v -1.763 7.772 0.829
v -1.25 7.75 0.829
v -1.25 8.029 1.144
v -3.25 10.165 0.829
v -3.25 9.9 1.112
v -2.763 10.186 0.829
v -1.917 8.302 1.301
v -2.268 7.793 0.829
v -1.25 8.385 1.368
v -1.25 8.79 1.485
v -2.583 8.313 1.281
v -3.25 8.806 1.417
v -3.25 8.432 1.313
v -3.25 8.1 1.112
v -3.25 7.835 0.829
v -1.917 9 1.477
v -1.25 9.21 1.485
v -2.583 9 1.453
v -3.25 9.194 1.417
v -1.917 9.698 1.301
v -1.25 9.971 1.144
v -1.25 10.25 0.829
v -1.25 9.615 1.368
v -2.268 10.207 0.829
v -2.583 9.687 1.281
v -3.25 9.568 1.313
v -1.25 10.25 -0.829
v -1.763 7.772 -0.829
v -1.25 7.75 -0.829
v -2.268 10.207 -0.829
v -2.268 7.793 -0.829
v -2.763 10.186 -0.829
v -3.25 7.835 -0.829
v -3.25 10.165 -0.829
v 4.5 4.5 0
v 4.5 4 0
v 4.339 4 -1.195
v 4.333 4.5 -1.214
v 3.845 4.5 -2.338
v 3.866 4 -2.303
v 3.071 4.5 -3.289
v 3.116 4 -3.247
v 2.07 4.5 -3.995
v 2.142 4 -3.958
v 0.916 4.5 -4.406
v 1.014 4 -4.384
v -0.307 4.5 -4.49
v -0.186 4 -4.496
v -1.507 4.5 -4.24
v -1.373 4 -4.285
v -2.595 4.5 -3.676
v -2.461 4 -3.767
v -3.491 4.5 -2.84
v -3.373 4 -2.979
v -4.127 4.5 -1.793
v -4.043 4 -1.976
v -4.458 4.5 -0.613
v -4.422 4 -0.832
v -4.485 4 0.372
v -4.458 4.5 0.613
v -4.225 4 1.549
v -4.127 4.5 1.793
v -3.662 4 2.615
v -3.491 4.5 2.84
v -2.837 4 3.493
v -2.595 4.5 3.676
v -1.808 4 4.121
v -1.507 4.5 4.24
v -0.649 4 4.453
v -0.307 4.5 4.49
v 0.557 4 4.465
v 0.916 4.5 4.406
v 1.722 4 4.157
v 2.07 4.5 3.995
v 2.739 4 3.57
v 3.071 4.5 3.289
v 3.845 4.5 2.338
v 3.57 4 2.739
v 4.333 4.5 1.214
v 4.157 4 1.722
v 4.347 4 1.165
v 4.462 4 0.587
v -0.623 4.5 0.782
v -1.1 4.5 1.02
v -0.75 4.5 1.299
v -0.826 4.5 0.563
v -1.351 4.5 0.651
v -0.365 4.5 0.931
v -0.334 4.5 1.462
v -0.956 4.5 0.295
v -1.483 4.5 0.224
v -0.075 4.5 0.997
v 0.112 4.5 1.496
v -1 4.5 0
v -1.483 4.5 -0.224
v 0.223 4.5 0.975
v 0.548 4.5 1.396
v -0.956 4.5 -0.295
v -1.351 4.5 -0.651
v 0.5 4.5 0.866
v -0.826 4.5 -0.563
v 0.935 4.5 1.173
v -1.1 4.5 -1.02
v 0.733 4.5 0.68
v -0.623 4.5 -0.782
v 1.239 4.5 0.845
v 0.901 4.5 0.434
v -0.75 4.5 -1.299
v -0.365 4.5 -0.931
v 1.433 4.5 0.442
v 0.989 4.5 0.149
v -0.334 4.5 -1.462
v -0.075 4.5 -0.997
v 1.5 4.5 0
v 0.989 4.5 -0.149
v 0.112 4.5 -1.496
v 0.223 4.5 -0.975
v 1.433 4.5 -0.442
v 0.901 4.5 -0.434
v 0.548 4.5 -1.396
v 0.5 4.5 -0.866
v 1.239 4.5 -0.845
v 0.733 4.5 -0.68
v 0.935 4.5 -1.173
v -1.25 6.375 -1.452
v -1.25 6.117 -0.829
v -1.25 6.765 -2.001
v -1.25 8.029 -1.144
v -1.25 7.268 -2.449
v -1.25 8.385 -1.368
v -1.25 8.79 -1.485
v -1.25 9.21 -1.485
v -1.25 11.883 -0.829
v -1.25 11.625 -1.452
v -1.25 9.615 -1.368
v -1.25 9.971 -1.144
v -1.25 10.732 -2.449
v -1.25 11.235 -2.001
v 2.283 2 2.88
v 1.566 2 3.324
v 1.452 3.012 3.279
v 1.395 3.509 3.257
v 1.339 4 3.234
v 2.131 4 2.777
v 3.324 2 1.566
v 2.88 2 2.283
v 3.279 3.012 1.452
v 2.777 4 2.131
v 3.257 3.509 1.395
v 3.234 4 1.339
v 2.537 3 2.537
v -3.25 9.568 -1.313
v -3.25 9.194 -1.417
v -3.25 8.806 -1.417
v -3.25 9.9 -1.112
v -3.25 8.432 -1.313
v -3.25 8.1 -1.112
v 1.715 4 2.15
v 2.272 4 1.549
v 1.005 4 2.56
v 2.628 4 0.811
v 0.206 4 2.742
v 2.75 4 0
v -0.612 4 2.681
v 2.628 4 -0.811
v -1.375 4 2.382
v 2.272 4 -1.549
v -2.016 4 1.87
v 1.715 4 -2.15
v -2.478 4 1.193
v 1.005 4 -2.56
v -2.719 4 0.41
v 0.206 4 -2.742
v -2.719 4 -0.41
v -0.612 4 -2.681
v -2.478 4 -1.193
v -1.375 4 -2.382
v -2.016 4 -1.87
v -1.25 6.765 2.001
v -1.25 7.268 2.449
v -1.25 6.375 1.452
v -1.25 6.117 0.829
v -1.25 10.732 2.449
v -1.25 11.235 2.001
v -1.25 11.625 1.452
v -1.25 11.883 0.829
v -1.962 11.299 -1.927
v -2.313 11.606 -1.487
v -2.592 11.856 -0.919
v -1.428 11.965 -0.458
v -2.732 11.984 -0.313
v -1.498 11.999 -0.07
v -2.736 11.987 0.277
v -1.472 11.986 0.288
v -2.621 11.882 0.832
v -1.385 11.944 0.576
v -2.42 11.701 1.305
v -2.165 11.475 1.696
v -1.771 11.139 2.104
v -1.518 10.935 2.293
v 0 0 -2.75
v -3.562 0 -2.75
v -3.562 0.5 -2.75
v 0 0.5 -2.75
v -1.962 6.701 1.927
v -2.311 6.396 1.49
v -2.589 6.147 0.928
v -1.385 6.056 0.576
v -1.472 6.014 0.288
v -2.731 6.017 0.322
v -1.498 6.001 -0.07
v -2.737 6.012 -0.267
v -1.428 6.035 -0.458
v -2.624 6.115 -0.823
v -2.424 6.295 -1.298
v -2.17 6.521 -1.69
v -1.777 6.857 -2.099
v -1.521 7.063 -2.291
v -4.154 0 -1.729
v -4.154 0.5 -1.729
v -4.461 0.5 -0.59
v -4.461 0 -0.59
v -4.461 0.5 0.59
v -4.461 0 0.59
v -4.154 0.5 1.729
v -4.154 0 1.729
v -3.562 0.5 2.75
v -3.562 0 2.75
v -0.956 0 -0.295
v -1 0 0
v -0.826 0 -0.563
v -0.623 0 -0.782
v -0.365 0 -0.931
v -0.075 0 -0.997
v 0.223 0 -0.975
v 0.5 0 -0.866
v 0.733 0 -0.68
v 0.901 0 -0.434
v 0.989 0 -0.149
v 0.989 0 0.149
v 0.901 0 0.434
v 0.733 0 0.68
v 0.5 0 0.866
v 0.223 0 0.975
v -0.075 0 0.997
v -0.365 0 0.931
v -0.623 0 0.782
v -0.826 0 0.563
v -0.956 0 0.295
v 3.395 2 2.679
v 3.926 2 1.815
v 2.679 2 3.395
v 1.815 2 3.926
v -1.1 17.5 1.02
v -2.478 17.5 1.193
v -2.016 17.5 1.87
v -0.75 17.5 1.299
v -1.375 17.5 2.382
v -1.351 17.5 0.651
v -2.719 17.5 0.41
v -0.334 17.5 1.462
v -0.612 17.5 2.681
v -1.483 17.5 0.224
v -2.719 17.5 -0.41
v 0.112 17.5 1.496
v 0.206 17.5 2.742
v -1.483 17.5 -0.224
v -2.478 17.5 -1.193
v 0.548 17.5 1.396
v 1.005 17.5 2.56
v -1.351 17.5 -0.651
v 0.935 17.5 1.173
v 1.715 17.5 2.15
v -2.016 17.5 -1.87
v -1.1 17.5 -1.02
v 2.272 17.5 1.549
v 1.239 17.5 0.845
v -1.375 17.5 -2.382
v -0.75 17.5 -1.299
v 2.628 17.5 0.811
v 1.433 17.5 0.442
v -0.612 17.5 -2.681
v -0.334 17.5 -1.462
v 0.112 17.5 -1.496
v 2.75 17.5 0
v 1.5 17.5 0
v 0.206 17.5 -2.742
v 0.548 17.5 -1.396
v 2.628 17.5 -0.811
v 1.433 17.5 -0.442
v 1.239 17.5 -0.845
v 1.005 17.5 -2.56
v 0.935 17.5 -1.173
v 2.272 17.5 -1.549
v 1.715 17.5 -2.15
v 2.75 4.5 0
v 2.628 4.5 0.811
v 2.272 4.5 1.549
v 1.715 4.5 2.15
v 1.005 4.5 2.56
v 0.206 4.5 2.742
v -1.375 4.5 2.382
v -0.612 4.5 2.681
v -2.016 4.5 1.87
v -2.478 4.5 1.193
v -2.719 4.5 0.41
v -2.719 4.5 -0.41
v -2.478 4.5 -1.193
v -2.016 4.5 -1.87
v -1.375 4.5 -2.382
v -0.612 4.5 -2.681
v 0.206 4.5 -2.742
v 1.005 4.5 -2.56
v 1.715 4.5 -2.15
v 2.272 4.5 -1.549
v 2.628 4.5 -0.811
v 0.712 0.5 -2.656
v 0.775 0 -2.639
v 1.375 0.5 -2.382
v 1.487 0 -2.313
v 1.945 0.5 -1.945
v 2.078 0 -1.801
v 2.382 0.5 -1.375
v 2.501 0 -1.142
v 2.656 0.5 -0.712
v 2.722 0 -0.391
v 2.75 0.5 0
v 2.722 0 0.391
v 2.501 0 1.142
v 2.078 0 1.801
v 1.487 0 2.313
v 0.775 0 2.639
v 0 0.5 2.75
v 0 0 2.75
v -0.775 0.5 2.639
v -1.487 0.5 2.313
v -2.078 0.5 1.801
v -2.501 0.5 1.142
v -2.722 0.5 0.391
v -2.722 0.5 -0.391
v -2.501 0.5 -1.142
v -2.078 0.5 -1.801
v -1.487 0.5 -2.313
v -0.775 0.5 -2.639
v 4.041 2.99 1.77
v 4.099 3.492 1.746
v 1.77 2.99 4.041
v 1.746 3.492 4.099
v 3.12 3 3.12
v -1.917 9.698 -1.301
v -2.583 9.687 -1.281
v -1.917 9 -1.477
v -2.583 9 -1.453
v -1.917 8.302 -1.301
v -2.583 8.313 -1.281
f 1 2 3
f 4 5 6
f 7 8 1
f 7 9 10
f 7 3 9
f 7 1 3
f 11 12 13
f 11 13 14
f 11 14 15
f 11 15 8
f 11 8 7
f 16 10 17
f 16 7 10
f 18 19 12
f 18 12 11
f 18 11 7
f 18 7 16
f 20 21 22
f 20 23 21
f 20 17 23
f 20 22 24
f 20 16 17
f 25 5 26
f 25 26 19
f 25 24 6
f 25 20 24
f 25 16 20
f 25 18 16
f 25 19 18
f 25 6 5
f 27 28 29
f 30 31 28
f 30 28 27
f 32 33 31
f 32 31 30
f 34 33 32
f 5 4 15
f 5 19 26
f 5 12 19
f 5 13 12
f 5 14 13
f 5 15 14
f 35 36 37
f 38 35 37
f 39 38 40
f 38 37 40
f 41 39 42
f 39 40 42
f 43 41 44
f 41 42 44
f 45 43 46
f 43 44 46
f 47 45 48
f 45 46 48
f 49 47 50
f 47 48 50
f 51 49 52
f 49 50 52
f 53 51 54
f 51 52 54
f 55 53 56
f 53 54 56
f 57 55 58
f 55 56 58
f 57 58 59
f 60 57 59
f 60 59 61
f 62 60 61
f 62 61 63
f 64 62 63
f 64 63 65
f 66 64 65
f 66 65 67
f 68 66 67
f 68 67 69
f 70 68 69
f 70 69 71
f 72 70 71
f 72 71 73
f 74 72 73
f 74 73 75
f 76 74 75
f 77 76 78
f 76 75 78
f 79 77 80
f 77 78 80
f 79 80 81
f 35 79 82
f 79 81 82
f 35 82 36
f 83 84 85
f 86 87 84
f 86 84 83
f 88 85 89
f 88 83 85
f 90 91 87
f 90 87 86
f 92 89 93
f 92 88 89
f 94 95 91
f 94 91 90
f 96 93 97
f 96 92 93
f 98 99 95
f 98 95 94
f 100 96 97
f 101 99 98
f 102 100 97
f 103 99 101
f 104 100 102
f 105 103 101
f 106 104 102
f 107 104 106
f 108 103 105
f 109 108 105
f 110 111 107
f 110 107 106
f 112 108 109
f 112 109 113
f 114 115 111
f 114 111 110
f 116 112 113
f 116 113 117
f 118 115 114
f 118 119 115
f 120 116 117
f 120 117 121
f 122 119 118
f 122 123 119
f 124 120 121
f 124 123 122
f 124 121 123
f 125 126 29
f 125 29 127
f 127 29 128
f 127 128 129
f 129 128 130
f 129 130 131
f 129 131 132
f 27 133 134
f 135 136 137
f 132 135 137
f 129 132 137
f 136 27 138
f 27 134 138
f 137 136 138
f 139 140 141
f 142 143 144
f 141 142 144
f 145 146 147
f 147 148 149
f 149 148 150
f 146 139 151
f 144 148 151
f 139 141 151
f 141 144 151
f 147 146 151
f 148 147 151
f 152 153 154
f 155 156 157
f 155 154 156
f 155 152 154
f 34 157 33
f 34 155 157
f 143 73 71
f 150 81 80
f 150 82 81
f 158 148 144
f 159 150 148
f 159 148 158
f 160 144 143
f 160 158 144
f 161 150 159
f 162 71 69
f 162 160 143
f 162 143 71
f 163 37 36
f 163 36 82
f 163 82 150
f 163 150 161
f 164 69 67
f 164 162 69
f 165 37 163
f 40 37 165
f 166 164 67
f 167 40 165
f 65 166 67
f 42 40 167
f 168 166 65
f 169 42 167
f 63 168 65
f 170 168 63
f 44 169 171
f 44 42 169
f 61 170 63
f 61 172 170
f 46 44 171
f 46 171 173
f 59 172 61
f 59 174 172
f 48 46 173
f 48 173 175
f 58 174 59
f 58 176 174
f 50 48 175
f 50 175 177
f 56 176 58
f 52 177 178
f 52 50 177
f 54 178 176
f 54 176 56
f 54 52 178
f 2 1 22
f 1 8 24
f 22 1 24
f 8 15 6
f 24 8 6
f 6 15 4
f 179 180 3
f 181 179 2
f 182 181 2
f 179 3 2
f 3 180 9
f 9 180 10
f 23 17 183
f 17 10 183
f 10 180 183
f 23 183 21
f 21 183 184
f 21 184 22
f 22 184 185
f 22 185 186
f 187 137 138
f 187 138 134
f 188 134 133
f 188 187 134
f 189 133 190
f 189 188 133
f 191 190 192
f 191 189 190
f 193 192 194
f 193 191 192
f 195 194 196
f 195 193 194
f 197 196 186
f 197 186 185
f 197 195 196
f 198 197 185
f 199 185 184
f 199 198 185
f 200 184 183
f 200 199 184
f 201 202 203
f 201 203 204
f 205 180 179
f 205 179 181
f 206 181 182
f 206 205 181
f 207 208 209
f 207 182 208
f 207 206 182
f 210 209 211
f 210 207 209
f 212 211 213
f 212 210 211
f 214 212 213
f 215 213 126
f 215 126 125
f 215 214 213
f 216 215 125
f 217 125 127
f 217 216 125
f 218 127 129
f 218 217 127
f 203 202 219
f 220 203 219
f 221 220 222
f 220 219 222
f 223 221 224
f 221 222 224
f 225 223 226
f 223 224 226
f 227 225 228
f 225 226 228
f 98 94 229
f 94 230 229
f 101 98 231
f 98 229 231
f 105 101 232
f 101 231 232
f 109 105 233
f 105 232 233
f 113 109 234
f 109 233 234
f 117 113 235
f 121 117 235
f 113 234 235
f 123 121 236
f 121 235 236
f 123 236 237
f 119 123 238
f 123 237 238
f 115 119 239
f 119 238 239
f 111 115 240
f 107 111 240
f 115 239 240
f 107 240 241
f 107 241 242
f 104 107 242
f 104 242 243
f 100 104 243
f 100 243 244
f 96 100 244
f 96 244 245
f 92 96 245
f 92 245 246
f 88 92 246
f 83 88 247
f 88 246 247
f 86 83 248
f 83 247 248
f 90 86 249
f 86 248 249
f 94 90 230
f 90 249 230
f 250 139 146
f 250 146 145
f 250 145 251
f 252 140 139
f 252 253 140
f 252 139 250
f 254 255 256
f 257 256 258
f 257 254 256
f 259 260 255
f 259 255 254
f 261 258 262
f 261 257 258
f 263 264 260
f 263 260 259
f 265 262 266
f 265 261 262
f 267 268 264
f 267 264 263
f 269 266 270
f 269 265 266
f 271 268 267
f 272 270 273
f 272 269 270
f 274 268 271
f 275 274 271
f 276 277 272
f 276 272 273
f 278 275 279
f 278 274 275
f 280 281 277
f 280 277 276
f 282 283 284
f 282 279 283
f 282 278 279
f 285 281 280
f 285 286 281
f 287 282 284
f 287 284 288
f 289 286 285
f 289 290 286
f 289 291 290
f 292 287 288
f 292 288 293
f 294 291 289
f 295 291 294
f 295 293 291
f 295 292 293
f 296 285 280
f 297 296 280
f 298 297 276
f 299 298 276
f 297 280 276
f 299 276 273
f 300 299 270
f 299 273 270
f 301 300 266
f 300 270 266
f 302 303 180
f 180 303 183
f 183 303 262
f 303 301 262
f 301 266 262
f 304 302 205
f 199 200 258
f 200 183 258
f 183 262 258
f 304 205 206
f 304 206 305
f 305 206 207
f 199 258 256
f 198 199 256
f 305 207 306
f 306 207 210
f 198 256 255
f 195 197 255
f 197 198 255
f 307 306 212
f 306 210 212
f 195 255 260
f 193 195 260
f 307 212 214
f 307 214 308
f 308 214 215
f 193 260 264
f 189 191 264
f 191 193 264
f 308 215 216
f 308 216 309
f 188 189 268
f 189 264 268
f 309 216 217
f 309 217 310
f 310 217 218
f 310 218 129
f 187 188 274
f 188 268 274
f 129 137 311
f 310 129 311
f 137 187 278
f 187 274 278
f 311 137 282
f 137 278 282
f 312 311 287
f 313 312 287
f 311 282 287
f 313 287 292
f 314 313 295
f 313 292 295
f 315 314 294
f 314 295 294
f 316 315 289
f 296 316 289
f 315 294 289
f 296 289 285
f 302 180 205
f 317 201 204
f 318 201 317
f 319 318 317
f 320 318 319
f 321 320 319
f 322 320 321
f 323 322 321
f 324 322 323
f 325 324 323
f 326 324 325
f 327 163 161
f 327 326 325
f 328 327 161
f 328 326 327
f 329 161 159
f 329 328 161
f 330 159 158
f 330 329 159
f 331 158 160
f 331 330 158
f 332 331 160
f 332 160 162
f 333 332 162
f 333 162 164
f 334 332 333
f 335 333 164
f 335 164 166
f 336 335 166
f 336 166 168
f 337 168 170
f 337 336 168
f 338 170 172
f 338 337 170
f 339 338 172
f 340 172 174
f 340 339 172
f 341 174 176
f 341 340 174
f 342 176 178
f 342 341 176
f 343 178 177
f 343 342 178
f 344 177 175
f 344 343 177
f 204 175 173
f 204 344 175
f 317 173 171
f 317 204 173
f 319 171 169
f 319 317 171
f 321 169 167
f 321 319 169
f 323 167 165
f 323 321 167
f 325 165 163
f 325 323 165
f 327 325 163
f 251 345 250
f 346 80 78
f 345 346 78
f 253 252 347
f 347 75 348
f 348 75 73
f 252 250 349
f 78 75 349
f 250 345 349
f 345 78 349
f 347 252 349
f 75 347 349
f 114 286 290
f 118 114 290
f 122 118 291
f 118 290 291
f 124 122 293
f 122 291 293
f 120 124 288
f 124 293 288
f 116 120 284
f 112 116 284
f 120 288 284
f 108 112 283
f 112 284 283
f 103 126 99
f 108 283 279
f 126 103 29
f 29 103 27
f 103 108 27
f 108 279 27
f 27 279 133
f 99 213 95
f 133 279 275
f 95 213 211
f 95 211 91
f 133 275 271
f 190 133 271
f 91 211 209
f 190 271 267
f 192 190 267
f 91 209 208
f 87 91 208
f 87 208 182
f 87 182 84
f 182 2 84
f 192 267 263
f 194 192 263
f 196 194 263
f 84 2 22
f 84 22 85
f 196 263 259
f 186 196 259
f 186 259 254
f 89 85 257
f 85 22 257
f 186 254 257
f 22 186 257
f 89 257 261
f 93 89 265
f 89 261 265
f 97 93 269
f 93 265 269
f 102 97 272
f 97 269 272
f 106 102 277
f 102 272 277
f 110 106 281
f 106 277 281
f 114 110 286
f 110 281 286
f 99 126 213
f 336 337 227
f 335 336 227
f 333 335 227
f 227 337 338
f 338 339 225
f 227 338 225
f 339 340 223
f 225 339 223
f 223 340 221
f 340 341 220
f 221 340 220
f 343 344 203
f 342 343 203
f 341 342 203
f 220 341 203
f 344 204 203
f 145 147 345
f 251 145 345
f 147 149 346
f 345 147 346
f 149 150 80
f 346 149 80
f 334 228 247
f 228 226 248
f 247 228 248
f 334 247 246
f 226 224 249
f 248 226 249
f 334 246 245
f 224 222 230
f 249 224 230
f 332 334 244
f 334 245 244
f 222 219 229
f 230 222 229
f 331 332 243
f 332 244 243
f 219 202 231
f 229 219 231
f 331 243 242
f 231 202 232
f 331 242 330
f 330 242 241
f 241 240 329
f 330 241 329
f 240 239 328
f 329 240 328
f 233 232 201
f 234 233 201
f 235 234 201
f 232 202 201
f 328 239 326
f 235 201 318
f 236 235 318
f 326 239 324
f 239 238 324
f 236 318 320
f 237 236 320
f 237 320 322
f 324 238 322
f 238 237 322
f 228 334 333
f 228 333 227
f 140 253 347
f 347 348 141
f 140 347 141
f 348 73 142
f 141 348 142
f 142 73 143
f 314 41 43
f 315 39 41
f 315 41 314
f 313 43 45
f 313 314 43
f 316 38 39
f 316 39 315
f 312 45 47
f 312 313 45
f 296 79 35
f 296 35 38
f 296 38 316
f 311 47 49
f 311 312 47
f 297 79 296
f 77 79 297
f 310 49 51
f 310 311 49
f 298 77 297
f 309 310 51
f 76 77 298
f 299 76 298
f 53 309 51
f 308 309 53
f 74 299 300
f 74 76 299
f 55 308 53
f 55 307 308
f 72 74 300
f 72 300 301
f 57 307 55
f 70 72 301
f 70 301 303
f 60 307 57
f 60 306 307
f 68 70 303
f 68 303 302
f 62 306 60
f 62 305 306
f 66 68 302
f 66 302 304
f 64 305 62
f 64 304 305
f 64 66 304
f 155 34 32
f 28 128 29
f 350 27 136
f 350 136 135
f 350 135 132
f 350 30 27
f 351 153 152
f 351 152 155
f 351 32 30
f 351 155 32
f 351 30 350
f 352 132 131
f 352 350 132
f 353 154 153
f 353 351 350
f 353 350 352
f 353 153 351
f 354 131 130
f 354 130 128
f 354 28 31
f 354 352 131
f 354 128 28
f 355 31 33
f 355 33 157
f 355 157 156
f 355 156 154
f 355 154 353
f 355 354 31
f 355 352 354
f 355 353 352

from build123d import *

# Parameters (mm, degrees)
SKETCH_1_R                = 4.5
EXTRUDE_1_DEPTH           = 17.5
SKETCH_2_W                = 1.75
SKETCH_2_H                = 13
SKETCH_3_W                = 1.75
SKETCH_3_H                = 3.5
CUT_EXTRUDE_1_DEPTH       = 0.5
EXTRUDE_2_DEPTH           = 2
EXTRUDE_2_DRAFT           = 5
SKETCH_7_R                = 3
CUT_EXTRUDE_2_DEPTH       = 1.5
SKETCH_8_R                = 1.5
EXTRUDE_3_DEPTH           = 2
EXTRUDE_3_TAPER           = 2
HOLE_WIZARD_1_D           = 2
HOLE_WIZARD_1_CBORE_D     = 3
HOLE_WIZARD_1_CBORE_DEPTH = 13
CUT_EXTRUDE_4_REACH       = 9.75
SKETCH_16_W               = 1.658312396
SKETCH_16_H               = 2.982539584


with BuildPart() as part:
    # 草图1 → 凸台-拉伸1 (new body)
    with BuildSketch(Plane(origin=(0, 0, 0), x_dir=(1, 0, 0), z_dir=(0, 1, 0))):
        Circle(SKETCH_1_R)
    extrude(amount=EXTRUDE_1_DEPTH)

    # 草图2 → 切除-旋转1 (revolve, cut)
    with BuildSketch(Plane.XY):
        with Locations((3.625, 11)):
            Rectangle(SKETCH_2_W, SKETCH_2_H)
    revolve(axis=Axis((0, 0, 0), (0, -1, 0)), mode=Mode.SUBTRACT)

    # 草图3 → 切除-旋转2 (revolve, cut)
    with BuildSketch(Plane.XY):
        with Locations((3.625, 2.25)):
            Rectangle(SKETCH_3_W, SKETCH_3_H)
    revolve(axis=Axis((0, 0, 0), (0, 1, 0)), mode=Mode.SUBTRACT)

    # 草图4 → 切除-拉伸1 (cut)
    with BuildSketch(Plane.XZ):
        with BuildLine():
            Line((0, 2.75), (-3.561951712, 2.75))
            ThreePointArc((-3.561951712, 2.75), (4.5, 0), (-3.561951712, -2.75))
            Line((-3.561951712, -2.75), (0, -2.75))
            ThreePointArc((0, -2.75), (2.75, 0), (0, 2.75))
        make_face()
    extrude(amount=-CUT_EXTRUDE_1_DEPTH, mode=Mode.SUBTRACT)


with BuildPart() as extrude_2_tool:
    # 草图6 → 凸台-拉伸2 (with draft: the straight prism first)
    with BuildSketch(Plane.XZ.offset(-4)):
        with BuildLine():
            ThreePointArc((1.339392013, 3.233578364), (2.474873734, 2.474873734), (3.233578364, 1.339392013))
            Line((3.233578364, 1.339392013), (4.157457896, 1.722075446))
            ThreePointArc((4.157457896, 1.722075446), (3.181980515, 3.181980515), (1.722075446, 4.157457896))
            Line((1.722075446, 4.157457896), (1.339392013, 3.233578364))
        make_face()
    extrude(amount=EXTRUDE_2_DEPTH)
    # 凸台-拉伸2: the draft: its side faces are tilted about the plane it starts from
    extrude_2_sides = [extrude_2_tool.faces().sort_by_distance(p)[0] for p in [
        (3.181980515, 3, 3.181980515),
        (1.530733729, 3, 3.69551813),
        (2.474873734, 3, 2.474873734),
        (3.69551813, 3, 1.530733729),
    ]]
    draft(extrude_2_sides, Plane.XZ.offset(-4), EXTRUDE_2_DRAFT)


with BuildPart() as part_1:
    add(part.part)

    # 凸台-拉伸2: add extrude_2_tool
    add(extrude_2_tool.part)

    # 草图7 → 切除-拉伸2 (cut)
    with BuildSketch(Plane(origin=(-2.75, 0, 0), x_dir=(0, 0, -1), z_dir=(1, 0, 0))):
        with Locations((0, 9)):
            Circle(SKETCH_7_R)
    extrude(amount=CUT_EXTRUDE_2_DEPTH, mode=Mode.SUBTRACT)

    # 草图8 → 凸台-拉伸3 (add)
    with BuildSketch(Plane.ZY.offset(1.25)):
        with Locations((0, 9)):
            Circle(SKETCH_8_R)
    extrude(amount=EXTRUDE_3_DEPTH, taper=EXTRUDE_3_TAPER)

    # 孔1 (through all)
    with Locations(Plane(origin=(0, 17.5, 0), x_dir=(1, 0, 0), z_dir=(0, 1, 0))):
        with Locations((0, 0)):
            CounterBoreHole(HOLE_WIZARD_1_D / 2, HOLE_WIZARD_1_CBORE_D / 2, HOLE_WIZARD_1_CBORE_DEPTH)

    # 草图16 → 切除-拉伸4 (cut, up to next)
    with BuildSketch(Plane.ZY.offset(3.25), mode=Mode.PRIVATE) as cut_extrude_4_sk1:
        with Locations((0, 9)):
            Rectangle(SKETCH_16_W, SKETCH_16_H)
    cut_extrude_4_tool1 = extrude(cut_extrude_4_sk1.sketch, amount=-CUT_EXTRUDE_4_REACH, mode=Mode.PRIVATE) & part_1.part
    add(cut_extrude_4_tool1.solids().sort_by_distance((-3.25, 9, 0))[0], mode=Mode.SUBTRACT)


solid = part_1.part
